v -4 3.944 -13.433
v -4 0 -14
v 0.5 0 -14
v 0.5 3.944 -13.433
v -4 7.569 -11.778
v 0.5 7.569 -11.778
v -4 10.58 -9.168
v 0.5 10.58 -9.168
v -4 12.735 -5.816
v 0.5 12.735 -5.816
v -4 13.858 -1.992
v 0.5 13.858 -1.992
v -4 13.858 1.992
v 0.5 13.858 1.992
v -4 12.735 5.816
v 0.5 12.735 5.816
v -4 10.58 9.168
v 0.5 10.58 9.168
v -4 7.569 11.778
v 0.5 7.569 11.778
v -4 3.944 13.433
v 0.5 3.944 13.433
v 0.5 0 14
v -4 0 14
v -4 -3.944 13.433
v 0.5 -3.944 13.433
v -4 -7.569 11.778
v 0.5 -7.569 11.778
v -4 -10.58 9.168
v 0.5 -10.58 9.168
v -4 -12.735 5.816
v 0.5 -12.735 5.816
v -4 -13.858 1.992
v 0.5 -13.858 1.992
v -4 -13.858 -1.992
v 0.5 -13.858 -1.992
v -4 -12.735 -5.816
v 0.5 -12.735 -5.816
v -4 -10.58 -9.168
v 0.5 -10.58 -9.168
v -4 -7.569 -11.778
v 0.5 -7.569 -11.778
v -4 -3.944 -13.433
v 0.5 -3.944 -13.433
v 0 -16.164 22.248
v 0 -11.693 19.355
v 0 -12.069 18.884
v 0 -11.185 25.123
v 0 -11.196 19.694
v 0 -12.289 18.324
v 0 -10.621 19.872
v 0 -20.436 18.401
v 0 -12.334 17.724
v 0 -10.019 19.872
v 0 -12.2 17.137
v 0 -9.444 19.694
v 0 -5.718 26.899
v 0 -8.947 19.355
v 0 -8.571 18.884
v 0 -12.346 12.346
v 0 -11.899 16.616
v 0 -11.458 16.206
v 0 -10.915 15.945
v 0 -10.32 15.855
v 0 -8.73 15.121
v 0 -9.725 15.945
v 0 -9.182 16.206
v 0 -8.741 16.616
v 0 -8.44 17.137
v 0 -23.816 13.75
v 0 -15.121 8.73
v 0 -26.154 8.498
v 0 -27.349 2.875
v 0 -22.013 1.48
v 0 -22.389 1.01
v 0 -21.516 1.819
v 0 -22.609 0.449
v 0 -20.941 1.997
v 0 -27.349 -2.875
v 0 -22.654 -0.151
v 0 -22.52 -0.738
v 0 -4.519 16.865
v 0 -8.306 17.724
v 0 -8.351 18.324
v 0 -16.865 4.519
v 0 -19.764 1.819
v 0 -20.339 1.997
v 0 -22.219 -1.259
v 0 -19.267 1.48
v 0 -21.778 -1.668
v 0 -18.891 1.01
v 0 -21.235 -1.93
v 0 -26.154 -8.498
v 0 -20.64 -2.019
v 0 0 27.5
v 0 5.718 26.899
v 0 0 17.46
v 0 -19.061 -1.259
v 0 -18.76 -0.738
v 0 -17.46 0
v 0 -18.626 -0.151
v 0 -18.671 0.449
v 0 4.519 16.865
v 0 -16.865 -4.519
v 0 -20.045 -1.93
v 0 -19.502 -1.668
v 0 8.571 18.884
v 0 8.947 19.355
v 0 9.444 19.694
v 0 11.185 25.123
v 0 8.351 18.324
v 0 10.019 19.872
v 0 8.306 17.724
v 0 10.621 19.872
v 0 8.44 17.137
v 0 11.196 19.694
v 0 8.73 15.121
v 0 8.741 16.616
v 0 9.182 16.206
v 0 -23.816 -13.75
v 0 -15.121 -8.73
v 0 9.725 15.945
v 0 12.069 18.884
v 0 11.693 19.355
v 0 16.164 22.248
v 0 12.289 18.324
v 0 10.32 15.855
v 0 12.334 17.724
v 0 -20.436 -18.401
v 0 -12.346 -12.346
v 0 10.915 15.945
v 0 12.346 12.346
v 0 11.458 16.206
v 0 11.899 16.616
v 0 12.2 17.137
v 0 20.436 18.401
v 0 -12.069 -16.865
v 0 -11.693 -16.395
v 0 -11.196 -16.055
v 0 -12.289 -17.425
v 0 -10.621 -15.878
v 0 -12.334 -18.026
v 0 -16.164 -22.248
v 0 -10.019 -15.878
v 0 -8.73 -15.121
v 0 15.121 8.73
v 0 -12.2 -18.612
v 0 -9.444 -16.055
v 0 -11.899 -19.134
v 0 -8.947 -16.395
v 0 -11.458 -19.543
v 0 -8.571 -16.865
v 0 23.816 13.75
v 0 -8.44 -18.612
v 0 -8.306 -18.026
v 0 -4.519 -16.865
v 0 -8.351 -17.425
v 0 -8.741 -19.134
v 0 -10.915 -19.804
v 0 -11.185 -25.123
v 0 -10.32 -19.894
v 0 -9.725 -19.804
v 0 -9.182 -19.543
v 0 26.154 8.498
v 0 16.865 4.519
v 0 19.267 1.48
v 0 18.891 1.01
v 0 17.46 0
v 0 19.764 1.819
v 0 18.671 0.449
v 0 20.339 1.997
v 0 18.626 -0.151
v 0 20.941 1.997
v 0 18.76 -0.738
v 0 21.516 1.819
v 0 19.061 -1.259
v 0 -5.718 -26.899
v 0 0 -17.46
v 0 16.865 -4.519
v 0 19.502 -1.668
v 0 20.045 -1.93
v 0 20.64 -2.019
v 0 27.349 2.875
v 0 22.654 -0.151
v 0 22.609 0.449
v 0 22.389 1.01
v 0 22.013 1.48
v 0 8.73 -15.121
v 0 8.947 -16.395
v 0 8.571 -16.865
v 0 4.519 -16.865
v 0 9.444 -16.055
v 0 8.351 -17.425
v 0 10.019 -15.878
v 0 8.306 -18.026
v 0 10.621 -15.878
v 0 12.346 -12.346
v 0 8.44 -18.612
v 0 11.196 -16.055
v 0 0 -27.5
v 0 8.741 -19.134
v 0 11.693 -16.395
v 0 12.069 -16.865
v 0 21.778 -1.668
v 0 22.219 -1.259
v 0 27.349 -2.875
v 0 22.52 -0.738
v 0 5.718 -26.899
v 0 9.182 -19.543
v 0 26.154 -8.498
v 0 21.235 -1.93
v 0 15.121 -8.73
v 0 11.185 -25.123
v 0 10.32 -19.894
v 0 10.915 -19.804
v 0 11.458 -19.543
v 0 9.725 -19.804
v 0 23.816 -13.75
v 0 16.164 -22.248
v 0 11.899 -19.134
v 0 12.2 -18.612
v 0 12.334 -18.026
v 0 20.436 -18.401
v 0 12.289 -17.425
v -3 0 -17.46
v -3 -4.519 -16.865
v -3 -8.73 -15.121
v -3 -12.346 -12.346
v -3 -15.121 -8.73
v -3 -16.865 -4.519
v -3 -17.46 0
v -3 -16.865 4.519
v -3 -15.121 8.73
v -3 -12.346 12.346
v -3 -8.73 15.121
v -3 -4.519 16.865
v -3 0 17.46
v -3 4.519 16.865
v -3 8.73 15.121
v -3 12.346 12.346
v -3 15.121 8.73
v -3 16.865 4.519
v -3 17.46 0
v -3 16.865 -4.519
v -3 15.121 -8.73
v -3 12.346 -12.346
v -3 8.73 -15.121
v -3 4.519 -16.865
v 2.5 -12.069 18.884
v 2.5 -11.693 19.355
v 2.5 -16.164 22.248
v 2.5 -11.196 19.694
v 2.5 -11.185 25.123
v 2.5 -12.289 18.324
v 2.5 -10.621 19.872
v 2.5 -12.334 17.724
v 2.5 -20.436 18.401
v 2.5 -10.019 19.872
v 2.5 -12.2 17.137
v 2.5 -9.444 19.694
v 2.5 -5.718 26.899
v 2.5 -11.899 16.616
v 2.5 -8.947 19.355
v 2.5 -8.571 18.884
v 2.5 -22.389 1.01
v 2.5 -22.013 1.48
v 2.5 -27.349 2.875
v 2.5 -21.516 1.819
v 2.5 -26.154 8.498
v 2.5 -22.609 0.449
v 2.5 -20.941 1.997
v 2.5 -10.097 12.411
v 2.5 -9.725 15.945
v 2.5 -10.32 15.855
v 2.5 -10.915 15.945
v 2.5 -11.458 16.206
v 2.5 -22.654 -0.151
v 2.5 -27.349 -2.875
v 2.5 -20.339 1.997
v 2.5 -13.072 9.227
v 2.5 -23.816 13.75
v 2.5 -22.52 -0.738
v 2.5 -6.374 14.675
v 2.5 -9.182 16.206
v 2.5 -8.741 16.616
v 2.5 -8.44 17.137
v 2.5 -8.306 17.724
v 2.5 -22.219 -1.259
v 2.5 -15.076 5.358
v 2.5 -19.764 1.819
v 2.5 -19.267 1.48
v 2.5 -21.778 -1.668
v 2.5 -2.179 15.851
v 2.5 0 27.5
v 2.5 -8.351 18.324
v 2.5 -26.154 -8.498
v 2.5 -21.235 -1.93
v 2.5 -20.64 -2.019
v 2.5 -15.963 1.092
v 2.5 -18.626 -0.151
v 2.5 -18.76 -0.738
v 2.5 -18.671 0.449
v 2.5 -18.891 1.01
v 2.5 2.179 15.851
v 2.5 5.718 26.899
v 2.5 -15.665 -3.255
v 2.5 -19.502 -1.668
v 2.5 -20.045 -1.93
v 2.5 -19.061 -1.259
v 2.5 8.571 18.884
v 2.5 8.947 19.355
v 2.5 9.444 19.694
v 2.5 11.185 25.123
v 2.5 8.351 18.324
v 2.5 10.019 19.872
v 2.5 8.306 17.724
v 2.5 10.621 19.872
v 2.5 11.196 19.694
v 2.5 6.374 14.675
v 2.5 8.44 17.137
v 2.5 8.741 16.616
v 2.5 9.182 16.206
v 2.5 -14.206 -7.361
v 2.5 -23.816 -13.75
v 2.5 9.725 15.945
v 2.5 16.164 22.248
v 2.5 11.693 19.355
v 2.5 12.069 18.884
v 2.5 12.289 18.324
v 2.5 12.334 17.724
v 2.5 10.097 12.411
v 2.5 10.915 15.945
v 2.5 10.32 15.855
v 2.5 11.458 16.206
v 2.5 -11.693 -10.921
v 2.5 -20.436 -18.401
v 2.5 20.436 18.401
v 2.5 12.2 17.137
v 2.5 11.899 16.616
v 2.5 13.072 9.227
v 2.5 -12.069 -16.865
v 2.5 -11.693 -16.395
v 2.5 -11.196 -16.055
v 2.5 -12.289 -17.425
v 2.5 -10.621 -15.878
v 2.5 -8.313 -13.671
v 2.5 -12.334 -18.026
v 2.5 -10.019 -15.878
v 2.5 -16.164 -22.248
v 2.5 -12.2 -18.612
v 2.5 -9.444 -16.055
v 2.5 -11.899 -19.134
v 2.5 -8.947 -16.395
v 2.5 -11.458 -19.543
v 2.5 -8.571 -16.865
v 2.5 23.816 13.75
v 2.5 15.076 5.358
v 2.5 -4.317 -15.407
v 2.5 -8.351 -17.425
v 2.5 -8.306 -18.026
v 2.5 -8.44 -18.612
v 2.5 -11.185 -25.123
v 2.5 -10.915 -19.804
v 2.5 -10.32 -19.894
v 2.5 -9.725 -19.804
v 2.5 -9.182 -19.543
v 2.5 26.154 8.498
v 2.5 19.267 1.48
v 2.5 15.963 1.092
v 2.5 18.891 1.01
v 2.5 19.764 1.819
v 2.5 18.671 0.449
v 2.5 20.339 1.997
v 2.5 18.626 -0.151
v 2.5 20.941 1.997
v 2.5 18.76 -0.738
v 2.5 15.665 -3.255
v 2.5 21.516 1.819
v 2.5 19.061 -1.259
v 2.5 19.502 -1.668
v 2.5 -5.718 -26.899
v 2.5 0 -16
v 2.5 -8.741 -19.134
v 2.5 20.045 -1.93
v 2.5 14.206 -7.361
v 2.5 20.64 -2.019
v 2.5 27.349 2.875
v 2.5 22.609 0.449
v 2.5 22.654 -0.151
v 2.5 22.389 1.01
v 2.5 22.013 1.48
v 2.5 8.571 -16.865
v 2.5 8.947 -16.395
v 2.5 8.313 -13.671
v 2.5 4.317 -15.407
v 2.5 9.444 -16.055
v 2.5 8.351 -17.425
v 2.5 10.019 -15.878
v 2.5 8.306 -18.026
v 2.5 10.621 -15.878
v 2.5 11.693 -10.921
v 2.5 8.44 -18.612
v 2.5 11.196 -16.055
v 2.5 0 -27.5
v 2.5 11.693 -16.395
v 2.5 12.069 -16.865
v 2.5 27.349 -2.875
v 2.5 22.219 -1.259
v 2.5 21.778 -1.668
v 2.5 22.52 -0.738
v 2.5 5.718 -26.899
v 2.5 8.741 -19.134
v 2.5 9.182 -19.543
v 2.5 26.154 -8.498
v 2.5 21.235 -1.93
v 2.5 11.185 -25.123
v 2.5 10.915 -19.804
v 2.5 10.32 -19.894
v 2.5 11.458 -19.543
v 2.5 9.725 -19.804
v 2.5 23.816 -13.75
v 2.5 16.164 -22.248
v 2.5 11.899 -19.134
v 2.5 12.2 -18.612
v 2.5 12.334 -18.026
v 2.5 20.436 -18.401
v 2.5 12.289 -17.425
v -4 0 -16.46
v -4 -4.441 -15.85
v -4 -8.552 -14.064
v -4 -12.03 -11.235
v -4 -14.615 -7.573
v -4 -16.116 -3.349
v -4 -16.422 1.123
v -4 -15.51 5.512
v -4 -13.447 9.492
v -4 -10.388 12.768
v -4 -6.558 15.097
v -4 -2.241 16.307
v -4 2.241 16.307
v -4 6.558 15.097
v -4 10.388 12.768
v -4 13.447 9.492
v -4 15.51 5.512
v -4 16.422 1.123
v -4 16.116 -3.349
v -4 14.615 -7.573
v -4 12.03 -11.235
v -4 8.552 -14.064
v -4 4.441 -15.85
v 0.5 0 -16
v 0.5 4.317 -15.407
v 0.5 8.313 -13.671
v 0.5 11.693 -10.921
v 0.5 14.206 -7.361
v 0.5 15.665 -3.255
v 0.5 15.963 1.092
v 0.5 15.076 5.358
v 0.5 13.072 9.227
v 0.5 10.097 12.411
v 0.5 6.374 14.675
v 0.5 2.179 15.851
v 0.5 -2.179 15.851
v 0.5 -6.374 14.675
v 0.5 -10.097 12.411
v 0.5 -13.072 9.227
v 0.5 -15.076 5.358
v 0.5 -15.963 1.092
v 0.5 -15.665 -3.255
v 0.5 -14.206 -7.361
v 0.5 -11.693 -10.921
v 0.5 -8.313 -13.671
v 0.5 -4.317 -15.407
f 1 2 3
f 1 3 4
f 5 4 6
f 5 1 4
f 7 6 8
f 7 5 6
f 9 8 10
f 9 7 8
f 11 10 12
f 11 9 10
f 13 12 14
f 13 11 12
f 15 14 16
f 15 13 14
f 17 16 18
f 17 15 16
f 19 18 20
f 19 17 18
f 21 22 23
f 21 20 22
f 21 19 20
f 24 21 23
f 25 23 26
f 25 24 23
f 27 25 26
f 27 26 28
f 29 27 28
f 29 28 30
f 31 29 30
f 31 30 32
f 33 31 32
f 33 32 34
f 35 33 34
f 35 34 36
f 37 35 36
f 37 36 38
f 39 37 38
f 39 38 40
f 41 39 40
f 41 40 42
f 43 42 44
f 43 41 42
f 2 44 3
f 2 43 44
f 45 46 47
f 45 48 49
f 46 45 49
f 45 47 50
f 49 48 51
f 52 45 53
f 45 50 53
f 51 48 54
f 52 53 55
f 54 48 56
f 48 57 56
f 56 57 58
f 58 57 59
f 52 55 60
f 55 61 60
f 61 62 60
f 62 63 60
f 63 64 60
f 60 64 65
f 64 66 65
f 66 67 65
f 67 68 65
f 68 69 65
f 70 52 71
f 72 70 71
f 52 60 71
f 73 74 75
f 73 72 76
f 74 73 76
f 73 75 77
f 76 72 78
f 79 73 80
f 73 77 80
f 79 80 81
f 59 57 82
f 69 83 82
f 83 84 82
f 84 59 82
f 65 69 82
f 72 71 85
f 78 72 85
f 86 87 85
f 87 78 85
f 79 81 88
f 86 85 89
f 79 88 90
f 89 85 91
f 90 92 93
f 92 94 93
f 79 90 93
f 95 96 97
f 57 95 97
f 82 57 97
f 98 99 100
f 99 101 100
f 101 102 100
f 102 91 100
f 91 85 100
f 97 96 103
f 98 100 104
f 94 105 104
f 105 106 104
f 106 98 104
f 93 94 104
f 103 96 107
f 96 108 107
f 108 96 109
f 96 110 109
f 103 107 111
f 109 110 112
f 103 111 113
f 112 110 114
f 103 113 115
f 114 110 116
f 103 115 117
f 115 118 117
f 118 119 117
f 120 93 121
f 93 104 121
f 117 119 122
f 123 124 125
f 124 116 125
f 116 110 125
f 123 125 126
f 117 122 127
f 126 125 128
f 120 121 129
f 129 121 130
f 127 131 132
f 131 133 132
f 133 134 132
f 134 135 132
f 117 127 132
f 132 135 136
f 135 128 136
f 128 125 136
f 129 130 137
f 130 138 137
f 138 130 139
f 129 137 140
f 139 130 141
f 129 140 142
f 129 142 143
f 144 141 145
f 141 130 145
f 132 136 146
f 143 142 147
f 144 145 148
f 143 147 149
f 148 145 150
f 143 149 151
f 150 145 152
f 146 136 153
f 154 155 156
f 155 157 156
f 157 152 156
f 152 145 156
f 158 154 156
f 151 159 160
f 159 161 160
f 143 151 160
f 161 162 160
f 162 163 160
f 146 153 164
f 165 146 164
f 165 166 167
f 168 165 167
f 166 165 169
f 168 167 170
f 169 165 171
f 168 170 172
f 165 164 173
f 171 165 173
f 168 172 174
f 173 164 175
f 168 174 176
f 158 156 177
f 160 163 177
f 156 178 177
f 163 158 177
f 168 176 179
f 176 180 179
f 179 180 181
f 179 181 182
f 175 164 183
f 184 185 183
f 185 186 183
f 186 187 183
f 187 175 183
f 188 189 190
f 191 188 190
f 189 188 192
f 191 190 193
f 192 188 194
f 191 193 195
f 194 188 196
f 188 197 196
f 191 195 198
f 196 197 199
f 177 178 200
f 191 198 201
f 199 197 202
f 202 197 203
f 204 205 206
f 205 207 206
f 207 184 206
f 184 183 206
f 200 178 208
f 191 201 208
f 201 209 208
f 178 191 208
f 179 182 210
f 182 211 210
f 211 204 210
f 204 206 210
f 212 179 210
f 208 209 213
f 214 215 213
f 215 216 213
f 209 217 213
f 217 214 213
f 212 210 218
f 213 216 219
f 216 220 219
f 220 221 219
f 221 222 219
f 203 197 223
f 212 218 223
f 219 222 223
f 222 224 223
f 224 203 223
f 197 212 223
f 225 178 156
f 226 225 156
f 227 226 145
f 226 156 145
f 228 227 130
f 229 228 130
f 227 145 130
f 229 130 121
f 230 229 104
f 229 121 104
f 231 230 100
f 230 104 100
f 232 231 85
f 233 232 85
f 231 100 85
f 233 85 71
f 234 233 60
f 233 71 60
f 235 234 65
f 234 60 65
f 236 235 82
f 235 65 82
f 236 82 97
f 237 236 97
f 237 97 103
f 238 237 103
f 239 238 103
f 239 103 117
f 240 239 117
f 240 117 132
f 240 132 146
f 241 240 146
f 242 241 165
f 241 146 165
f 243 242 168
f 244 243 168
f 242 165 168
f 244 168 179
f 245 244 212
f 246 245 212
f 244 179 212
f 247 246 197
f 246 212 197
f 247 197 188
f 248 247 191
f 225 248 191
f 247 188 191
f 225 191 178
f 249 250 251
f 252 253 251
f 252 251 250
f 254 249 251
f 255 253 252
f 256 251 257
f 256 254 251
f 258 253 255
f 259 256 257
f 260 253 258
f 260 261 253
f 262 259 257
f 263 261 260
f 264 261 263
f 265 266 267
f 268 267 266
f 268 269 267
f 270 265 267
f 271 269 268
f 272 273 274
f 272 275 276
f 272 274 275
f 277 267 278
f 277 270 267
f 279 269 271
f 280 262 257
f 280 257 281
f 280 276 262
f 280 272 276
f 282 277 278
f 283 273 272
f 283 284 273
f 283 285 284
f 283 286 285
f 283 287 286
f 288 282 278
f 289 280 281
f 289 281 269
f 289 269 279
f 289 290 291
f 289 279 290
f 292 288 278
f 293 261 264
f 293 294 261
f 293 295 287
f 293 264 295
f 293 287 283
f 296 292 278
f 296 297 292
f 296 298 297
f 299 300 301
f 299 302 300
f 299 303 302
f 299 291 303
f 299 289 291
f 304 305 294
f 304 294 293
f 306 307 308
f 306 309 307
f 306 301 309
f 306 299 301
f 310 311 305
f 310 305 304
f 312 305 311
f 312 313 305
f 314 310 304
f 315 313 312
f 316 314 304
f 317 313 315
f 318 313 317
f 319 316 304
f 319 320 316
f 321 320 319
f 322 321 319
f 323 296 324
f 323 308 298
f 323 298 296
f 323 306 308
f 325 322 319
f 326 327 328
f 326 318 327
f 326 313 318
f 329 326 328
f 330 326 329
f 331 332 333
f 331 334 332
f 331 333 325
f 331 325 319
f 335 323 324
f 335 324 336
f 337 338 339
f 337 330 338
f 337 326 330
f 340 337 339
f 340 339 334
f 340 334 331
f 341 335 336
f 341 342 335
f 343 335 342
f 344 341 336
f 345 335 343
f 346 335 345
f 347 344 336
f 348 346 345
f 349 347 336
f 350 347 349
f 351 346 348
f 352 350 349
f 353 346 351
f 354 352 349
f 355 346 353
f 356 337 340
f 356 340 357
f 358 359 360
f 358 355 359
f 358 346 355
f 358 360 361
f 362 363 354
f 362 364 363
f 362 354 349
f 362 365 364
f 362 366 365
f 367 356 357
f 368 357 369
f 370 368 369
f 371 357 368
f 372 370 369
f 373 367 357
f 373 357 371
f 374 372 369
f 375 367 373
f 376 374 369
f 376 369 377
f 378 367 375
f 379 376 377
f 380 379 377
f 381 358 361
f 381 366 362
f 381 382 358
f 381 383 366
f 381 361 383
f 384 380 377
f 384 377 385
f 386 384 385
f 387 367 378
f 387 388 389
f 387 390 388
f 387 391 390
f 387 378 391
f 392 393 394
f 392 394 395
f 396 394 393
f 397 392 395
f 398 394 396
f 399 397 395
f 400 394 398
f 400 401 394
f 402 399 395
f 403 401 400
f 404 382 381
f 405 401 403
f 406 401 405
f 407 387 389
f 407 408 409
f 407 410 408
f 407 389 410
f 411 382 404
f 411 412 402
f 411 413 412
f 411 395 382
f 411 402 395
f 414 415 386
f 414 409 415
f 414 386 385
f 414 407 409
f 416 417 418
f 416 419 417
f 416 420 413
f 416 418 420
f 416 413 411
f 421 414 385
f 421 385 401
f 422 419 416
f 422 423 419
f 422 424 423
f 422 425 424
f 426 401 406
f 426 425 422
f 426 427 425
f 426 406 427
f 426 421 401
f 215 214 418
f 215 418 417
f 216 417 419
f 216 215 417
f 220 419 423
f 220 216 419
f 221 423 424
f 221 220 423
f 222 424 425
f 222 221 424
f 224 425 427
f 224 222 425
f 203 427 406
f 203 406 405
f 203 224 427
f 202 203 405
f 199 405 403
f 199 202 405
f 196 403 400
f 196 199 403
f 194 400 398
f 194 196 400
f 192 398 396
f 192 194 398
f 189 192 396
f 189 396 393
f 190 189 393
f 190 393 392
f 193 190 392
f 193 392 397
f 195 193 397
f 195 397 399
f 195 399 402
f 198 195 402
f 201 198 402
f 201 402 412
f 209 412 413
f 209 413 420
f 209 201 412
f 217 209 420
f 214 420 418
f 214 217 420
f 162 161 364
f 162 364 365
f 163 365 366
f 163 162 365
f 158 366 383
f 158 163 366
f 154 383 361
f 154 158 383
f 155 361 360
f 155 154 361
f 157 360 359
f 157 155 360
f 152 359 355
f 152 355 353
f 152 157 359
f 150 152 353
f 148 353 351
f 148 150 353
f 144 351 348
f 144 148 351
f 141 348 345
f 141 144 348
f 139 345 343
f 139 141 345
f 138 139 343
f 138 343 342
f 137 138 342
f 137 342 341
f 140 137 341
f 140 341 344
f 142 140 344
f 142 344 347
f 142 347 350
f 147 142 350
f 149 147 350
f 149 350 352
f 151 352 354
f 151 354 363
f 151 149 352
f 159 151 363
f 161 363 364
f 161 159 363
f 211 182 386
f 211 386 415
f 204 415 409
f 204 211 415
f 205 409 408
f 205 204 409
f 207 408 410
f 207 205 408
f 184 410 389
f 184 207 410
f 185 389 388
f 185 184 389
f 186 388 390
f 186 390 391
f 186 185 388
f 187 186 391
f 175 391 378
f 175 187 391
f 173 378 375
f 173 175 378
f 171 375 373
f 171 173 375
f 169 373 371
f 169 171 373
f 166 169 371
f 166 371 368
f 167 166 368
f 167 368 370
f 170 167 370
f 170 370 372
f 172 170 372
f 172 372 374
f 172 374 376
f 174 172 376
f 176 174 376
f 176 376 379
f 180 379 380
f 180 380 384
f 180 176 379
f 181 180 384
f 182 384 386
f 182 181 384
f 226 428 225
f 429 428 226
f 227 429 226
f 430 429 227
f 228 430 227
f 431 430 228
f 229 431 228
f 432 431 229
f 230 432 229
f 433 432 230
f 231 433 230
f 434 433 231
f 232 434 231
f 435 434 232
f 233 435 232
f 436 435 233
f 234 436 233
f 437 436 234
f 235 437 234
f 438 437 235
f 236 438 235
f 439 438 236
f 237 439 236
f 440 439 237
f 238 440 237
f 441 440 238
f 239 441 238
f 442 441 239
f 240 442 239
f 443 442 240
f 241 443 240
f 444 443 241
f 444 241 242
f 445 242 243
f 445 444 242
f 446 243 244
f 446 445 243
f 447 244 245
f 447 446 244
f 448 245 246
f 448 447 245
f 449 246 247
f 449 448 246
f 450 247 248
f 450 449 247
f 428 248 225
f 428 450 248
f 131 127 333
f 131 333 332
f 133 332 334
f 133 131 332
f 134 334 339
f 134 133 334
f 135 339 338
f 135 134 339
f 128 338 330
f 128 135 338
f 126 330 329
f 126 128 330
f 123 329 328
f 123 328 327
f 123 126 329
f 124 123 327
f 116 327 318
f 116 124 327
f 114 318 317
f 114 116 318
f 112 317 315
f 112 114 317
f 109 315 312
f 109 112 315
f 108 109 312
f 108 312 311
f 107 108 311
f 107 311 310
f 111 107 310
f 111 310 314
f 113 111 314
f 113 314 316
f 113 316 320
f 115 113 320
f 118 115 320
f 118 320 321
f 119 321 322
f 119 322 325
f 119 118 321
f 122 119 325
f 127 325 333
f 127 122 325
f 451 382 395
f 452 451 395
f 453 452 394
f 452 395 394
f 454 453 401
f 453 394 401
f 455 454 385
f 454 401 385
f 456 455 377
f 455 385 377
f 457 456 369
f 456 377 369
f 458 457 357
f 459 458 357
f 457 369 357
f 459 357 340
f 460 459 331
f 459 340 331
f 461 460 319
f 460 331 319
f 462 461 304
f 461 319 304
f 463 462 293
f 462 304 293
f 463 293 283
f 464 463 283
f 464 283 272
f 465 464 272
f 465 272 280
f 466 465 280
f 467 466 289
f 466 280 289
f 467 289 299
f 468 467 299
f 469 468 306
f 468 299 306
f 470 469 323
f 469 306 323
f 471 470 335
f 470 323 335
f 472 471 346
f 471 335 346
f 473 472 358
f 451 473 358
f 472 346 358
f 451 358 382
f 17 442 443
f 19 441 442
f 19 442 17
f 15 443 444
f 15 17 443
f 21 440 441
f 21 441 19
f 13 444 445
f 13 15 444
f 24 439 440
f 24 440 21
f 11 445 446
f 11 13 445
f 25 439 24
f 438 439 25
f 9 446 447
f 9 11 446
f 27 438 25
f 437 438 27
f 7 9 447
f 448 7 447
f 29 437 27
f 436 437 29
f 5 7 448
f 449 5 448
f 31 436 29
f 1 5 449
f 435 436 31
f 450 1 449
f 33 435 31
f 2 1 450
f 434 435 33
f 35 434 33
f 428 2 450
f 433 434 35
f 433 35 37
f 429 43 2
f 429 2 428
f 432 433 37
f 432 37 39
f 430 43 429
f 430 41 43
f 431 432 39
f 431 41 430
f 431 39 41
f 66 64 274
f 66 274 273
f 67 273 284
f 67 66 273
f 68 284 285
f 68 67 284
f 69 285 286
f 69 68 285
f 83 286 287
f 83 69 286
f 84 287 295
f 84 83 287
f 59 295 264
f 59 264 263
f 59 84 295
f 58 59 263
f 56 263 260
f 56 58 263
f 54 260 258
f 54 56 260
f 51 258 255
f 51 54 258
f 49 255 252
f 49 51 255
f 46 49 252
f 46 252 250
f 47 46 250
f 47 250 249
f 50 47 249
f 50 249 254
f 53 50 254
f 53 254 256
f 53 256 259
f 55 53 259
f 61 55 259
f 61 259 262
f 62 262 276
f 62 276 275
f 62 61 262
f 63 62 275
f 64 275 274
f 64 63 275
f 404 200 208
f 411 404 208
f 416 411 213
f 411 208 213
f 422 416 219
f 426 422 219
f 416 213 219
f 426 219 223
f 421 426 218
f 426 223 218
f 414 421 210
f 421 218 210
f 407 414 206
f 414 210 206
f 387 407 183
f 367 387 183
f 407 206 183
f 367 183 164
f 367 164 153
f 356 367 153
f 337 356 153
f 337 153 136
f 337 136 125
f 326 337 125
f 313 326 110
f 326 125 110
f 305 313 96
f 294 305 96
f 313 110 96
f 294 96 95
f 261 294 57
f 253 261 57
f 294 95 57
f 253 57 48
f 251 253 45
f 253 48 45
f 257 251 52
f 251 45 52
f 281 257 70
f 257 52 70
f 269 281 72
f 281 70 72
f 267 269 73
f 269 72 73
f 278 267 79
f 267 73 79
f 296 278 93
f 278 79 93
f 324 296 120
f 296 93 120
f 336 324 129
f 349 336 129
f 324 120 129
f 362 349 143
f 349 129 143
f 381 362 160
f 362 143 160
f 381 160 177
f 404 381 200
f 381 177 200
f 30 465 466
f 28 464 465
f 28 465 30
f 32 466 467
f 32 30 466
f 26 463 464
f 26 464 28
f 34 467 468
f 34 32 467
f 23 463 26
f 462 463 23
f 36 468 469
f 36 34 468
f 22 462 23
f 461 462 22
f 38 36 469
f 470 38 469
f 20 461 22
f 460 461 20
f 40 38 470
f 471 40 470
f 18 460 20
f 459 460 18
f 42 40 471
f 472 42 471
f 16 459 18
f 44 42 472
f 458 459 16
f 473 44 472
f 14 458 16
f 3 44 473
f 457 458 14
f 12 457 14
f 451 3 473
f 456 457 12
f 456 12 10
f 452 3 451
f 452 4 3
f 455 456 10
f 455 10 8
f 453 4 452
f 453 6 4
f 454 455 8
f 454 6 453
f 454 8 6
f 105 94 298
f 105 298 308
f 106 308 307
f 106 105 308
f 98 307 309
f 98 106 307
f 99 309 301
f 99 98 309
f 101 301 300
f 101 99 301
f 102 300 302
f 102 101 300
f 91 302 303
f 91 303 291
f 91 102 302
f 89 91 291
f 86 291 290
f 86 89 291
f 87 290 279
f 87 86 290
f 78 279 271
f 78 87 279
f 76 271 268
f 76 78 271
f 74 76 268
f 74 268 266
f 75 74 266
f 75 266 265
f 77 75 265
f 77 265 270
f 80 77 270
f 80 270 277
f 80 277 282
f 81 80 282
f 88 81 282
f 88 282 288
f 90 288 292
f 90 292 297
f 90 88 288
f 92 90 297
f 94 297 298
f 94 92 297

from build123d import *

# Parameters (mm, degrees)
SKETCH1_R           = 27.5
SKETCH1_R_2         = 2.0193
BOSS_EXTRUDE1_DEPTH = 2.5
SKETCH2_R           = 17.46
BOSS_EXTRUDE2_DEPTH = 4
CHAMFER5_SIZE       = 1
SKETCH6_R           = 14
CUT_EXTRUDE1_DEPTH  = 10
SKETCH9_R           = 16
CUT_EXTRUDE2_DEPTH  = 2


with BuildPart() as part:
    # Sketch1 → Boss-Extrude1 (new body)
    with BuildSketch(Plane(origin=(0, 0, 0), x_dir=(0, 0, -1), z_dir=(1, 0, 0))):
        Circle(SKETCH1_R)
        with Locations((0, 20.64)):
            Circle(SKETCH1_R_2, mode=Mode.SUBTRACT)
        with Locations((17.874764334, 10.32)):
            Circle(SKETCH1_R_2, mode=Mode.SUBTRACT)
        with Locations((17.874764334, -10.32)):
            Circle(SKETCH1_R_2, mode=Mode.SUBTRACT)
        with Locations((0, -20.64)):
            Circle(SKETCH1_R_2, mode=Mode.SUBTRACT)
        with Locations((-17.874764334, -10.32)):
            Circle(SKETCH1_R_2, mode=Mode.SUBTRACT)
        with Locations((-17.874764334, 10.32)):
            Circle(SKETCH1_R_2, mode=Mode.SUBTRACT)
    extrude(amount=BOSS_EXTRUDE1_DEPTH)

    # Sketch2 → Boss-Extrude2 (add)
    with BuildSketch(Plane.ZY):
        with Locations(Location((0, 0, 0), (0, 0, 180))):
            Circle(SKETCH2_R)
    extrude(amount=BOSS_EXTRUDE2_DEPTH)

    # Chamfer5
    chamfer5_edges = [part.edges().sort_by_distance(p)[0] for p in [
        (-4, 0, 17.46),
    ]]
    chamfer(chamfer5_edges, length=CHAMFER5_SIZE)

    # Sketch6 → Cut-Extrude1 (cut)
    with BuildSketch(Plane(origin=(-4, 0, 0), x_dir=(0, 0, -1), z_dir=(1, 0, 0))):
        Circle(SKETCH6_R)
    extrude(amount=CUT_EXTRUDE1_DEPTH, mode=Mode.SUBTRACT)

    # Sketch9 → Cut-Extrude2 (cut)
    with BuildSketch(Plane(origin=(2.5, 0, 0), x_dir=(0, 0, -1), z_dir=(1, 0, 0))):
        Circle(SKETCH9_R)
    extrude(amount=-CUT_EXTRUDE2_DEPTH, mode=Mode.SUBTRACT)


solid = part.part
